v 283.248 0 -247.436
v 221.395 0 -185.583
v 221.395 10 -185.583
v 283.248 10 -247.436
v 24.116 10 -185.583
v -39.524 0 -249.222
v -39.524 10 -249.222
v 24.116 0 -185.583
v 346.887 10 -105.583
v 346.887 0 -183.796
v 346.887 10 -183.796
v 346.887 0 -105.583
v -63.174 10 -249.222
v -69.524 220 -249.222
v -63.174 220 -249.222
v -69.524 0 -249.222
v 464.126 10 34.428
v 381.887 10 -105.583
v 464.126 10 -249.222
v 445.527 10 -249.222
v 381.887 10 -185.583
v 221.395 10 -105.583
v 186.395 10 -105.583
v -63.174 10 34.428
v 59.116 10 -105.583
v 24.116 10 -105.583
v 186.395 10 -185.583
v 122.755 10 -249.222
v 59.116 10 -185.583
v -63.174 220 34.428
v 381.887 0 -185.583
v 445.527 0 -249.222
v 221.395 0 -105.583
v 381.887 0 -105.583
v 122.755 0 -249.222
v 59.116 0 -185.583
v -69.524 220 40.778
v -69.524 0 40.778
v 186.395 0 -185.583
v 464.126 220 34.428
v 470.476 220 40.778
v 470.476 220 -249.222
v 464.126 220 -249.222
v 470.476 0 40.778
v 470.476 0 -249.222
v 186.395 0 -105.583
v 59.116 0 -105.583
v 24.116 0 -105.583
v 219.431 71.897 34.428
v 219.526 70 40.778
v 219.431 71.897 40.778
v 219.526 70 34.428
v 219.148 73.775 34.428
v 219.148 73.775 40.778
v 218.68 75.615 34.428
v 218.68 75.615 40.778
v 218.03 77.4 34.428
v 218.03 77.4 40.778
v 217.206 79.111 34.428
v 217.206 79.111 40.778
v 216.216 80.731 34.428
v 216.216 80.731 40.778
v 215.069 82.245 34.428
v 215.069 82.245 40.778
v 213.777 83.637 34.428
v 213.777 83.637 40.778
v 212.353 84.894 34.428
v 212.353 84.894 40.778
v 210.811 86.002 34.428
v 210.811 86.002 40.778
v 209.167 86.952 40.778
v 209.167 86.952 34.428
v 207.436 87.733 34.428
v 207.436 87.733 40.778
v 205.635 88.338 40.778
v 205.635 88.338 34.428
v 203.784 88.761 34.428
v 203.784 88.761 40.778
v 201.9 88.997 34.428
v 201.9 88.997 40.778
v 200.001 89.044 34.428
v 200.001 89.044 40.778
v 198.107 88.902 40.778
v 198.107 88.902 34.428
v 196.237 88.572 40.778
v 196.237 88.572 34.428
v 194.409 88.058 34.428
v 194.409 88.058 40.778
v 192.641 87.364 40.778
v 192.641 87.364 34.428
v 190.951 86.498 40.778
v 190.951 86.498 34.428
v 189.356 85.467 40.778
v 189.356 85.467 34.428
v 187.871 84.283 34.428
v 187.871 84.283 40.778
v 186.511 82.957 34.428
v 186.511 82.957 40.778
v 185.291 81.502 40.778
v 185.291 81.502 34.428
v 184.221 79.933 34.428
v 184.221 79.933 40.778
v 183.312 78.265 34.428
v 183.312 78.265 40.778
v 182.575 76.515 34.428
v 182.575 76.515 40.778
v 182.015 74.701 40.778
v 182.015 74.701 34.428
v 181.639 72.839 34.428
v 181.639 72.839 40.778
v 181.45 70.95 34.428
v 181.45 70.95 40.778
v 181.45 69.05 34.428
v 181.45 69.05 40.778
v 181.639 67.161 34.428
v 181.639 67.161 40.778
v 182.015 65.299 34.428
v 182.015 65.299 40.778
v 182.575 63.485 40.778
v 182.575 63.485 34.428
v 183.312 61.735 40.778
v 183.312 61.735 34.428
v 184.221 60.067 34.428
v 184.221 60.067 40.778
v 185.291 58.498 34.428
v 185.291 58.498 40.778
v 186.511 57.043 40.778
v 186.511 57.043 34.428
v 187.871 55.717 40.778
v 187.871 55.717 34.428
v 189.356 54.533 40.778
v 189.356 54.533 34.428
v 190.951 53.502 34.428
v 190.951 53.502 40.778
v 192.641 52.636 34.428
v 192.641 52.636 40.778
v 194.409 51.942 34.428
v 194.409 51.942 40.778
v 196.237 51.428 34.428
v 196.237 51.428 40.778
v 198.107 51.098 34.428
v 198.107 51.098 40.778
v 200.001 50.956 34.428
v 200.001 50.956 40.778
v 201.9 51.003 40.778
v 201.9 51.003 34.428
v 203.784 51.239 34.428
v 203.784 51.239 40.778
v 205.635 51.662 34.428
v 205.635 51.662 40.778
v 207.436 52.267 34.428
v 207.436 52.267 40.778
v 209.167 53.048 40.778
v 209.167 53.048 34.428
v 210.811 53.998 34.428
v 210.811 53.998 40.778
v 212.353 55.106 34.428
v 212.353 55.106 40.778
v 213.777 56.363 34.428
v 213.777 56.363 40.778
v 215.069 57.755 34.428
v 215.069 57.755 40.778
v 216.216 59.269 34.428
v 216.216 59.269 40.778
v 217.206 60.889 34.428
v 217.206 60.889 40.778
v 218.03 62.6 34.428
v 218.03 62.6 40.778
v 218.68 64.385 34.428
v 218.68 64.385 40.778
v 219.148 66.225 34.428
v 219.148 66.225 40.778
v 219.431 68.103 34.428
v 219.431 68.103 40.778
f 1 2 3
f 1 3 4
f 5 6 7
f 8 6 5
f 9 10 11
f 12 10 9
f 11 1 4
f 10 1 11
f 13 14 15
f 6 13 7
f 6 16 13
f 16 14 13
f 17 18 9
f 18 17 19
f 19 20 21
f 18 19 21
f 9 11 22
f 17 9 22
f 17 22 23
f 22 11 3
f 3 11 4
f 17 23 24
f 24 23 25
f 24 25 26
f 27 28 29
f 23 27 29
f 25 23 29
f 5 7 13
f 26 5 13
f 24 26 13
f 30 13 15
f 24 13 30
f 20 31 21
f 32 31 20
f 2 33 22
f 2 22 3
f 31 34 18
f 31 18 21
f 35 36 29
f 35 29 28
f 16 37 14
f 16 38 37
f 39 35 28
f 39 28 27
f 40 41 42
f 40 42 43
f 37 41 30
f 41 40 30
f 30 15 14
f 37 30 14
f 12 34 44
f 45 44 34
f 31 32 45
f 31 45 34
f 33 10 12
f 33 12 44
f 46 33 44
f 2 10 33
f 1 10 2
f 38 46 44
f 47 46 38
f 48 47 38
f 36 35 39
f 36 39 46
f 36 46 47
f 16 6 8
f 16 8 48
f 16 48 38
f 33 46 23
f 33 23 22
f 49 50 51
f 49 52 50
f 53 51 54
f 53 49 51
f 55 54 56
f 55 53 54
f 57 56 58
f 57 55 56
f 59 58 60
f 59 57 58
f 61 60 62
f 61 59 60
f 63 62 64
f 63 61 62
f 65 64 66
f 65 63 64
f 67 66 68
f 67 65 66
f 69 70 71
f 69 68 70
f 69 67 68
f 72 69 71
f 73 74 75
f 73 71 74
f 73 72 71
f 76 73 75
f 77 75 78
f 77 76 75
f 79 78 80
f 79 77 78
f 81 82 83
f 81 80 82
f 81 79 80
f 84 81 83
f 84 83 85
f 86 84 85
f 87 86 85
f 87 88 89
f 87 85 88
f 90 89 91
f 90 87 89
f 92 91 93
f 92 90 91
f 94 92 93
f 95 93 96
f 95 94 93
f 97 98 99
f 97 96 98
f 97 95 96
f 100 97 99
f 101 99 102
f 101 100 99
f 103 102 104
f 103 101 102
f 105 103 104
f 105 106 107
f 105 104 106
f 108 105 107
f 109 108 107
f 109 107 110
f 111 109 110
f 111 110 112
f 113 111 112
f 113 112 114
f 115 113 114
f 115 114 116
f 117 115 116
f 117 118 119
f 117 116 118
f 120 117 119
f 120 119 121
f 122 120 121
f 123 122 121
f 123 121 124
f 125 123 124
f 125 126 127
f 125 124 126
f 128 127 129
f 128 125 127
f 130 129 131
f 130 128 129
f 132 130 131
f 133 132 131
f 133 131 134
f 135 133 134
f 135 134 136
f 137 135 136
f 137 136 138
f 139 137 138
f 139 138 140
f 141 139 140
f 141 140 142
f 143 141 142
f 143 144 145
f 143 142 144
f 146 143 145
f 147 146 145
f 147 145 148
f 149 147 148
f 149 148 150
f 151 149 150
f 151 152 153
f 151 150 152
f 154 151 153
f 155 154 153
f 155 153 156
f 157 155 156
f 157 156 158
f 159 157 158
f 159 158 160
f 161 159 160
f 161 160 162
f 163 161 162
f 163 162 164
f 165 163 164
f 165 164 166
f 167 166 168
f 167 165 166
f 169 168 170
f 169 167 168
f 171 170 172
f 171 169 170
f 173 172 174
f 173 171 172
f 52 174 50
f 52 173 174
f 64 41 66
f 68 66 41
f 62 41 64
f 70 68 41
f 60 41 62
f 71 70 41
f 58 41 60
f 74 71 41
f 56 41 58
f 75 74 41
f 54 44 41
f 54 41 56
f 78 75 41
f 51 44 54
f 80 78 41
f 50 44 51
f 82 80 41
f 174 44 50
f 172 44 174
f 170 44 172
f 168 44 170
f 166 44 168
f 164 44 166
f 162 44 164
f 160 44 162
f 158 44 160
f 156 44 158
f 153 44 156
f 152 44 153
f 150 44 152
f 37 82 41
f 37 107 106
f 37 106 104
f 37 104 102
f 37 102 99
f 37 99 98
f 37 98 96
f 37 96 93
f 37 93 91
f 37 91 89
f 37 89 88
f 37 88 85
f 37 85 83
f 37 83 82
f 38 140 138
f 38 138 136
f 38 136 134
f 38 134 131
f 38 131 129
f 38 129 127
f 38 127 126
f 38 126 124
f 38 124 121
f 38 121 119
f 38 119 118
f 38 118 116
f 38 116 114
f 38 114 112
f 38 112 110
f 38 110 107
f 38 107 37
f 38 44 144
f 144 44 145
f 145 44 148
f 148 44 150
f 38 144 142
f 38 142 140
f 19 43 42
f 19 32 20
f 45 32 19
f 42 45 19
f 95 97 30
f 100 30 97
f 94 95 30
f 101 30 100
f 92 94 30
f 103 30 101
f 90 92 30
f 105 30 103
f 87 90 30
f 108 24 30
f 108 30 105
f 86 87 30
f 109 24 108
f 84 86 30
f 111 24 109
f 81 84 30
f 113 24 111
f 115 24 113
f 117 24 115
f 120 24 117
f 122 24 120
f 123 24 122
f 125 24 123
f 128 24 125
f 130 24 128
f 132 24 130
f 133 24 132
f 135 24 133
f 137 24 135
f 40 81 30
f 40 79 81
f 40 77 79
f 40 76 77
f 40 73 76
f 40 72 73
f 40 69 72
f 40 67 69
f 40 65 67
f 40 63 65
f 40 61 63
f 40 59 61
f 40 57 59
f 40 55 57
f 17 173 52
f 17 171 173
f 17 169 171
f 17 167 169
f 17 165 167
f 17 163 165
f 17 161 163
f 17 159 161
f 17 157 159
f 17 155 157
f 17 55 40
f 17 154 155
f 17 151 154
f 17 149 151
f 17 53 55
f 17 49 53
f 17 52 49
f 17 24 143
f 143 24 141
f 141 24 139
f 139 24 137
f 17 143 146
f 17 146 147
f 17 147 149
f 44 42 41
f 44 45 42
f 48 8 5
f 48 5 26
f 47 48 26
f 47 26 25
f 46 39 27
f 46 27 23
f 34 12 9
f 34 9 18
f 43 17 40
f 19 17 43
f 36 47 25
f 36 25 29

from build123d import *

# Parameters (mm, degrees)
BOSS_EXTRUDE5_DEPTH     = 10
BOSS_EXTRUDE6_DEPTH     = 210
CUT_EXTRUDE1_DEPTH      = 577.072414333
CUT_EXTRUDE1_DEPTH_BACK = 577.072414333
SKETCH6_R               = 19.05


with BuildPart() as part:
    # Sketch1 → Boss-Extrude5 (new body)
    with BuildSketch(Plane(origin=(0, 0, 0), x_dir=(1, 0, 0), z_dir=(0, 1, 0))):
        Polygon((-69.524052506, -40.777590524), (-69.524052506, 249.222409476), (-39.524052506, 249.222409476), (24.115557801, 185.58279917), (24.115557801, 105.58279917), (59.115557801, 105.58279917), (59.115557801, 185.58279917), (122.755168108, 249.222409476), (186.394778415, 185.58279917), (186.394778415, 105.58279917), (221.394778415, 105.58279917), (221.394778415, 185.58279917), (283.247626246, 247.435647001), (346.887236552, 183.796036694), (346.887236552, 105.58279917), (381.887236552, 105.58279917), (381.887236552, 185.58279917), (445.526846859, 249.222409476), (470.475947494, 249.222409476), (470.475947494, -40.777590524), align=None)
    extrude(amount=BOSS_EXTRUDE5_DEPTH)

    # Sketch5 → Boss-Extrude6 (add)
    with BuildSketch(Plane(origin=(0, 10, 0), x_dir=(1, 0, 0), z_dir=(0, 1, 0))):
        Polygon((-69.524052506, -40.777590524), (-69.524052506, 249.222409476), (-63.174052506, 249.222409476), (-63.174052506, -34.427590524), (464.125947494, -34.427590524), (464.125947494, 249.222409476), (470.475947494, 249.222409476), (470.475947494, -40.777590524), align=None)
    extrude(amount=BOSS_EXTRUDE6_DEPTH)

    # Sketch6 → Cut-Extrude1 (cut, two sides: drawn at the far end of the back side and taken through both)
    with BuildSketch(Plane.XY.offset(-CUT_EXTRUDE1_DEPTH_BACK)):
        with Locations((200.475947494, 70)):
            Circle(SKETCH6_R)
    extrude(amount=CUT_EXTRUDE1_DEPTH + CUT_EXTRUDE1_DEPTH_BACK, mode=Mode.SUBTRACT)


solid = part.part
